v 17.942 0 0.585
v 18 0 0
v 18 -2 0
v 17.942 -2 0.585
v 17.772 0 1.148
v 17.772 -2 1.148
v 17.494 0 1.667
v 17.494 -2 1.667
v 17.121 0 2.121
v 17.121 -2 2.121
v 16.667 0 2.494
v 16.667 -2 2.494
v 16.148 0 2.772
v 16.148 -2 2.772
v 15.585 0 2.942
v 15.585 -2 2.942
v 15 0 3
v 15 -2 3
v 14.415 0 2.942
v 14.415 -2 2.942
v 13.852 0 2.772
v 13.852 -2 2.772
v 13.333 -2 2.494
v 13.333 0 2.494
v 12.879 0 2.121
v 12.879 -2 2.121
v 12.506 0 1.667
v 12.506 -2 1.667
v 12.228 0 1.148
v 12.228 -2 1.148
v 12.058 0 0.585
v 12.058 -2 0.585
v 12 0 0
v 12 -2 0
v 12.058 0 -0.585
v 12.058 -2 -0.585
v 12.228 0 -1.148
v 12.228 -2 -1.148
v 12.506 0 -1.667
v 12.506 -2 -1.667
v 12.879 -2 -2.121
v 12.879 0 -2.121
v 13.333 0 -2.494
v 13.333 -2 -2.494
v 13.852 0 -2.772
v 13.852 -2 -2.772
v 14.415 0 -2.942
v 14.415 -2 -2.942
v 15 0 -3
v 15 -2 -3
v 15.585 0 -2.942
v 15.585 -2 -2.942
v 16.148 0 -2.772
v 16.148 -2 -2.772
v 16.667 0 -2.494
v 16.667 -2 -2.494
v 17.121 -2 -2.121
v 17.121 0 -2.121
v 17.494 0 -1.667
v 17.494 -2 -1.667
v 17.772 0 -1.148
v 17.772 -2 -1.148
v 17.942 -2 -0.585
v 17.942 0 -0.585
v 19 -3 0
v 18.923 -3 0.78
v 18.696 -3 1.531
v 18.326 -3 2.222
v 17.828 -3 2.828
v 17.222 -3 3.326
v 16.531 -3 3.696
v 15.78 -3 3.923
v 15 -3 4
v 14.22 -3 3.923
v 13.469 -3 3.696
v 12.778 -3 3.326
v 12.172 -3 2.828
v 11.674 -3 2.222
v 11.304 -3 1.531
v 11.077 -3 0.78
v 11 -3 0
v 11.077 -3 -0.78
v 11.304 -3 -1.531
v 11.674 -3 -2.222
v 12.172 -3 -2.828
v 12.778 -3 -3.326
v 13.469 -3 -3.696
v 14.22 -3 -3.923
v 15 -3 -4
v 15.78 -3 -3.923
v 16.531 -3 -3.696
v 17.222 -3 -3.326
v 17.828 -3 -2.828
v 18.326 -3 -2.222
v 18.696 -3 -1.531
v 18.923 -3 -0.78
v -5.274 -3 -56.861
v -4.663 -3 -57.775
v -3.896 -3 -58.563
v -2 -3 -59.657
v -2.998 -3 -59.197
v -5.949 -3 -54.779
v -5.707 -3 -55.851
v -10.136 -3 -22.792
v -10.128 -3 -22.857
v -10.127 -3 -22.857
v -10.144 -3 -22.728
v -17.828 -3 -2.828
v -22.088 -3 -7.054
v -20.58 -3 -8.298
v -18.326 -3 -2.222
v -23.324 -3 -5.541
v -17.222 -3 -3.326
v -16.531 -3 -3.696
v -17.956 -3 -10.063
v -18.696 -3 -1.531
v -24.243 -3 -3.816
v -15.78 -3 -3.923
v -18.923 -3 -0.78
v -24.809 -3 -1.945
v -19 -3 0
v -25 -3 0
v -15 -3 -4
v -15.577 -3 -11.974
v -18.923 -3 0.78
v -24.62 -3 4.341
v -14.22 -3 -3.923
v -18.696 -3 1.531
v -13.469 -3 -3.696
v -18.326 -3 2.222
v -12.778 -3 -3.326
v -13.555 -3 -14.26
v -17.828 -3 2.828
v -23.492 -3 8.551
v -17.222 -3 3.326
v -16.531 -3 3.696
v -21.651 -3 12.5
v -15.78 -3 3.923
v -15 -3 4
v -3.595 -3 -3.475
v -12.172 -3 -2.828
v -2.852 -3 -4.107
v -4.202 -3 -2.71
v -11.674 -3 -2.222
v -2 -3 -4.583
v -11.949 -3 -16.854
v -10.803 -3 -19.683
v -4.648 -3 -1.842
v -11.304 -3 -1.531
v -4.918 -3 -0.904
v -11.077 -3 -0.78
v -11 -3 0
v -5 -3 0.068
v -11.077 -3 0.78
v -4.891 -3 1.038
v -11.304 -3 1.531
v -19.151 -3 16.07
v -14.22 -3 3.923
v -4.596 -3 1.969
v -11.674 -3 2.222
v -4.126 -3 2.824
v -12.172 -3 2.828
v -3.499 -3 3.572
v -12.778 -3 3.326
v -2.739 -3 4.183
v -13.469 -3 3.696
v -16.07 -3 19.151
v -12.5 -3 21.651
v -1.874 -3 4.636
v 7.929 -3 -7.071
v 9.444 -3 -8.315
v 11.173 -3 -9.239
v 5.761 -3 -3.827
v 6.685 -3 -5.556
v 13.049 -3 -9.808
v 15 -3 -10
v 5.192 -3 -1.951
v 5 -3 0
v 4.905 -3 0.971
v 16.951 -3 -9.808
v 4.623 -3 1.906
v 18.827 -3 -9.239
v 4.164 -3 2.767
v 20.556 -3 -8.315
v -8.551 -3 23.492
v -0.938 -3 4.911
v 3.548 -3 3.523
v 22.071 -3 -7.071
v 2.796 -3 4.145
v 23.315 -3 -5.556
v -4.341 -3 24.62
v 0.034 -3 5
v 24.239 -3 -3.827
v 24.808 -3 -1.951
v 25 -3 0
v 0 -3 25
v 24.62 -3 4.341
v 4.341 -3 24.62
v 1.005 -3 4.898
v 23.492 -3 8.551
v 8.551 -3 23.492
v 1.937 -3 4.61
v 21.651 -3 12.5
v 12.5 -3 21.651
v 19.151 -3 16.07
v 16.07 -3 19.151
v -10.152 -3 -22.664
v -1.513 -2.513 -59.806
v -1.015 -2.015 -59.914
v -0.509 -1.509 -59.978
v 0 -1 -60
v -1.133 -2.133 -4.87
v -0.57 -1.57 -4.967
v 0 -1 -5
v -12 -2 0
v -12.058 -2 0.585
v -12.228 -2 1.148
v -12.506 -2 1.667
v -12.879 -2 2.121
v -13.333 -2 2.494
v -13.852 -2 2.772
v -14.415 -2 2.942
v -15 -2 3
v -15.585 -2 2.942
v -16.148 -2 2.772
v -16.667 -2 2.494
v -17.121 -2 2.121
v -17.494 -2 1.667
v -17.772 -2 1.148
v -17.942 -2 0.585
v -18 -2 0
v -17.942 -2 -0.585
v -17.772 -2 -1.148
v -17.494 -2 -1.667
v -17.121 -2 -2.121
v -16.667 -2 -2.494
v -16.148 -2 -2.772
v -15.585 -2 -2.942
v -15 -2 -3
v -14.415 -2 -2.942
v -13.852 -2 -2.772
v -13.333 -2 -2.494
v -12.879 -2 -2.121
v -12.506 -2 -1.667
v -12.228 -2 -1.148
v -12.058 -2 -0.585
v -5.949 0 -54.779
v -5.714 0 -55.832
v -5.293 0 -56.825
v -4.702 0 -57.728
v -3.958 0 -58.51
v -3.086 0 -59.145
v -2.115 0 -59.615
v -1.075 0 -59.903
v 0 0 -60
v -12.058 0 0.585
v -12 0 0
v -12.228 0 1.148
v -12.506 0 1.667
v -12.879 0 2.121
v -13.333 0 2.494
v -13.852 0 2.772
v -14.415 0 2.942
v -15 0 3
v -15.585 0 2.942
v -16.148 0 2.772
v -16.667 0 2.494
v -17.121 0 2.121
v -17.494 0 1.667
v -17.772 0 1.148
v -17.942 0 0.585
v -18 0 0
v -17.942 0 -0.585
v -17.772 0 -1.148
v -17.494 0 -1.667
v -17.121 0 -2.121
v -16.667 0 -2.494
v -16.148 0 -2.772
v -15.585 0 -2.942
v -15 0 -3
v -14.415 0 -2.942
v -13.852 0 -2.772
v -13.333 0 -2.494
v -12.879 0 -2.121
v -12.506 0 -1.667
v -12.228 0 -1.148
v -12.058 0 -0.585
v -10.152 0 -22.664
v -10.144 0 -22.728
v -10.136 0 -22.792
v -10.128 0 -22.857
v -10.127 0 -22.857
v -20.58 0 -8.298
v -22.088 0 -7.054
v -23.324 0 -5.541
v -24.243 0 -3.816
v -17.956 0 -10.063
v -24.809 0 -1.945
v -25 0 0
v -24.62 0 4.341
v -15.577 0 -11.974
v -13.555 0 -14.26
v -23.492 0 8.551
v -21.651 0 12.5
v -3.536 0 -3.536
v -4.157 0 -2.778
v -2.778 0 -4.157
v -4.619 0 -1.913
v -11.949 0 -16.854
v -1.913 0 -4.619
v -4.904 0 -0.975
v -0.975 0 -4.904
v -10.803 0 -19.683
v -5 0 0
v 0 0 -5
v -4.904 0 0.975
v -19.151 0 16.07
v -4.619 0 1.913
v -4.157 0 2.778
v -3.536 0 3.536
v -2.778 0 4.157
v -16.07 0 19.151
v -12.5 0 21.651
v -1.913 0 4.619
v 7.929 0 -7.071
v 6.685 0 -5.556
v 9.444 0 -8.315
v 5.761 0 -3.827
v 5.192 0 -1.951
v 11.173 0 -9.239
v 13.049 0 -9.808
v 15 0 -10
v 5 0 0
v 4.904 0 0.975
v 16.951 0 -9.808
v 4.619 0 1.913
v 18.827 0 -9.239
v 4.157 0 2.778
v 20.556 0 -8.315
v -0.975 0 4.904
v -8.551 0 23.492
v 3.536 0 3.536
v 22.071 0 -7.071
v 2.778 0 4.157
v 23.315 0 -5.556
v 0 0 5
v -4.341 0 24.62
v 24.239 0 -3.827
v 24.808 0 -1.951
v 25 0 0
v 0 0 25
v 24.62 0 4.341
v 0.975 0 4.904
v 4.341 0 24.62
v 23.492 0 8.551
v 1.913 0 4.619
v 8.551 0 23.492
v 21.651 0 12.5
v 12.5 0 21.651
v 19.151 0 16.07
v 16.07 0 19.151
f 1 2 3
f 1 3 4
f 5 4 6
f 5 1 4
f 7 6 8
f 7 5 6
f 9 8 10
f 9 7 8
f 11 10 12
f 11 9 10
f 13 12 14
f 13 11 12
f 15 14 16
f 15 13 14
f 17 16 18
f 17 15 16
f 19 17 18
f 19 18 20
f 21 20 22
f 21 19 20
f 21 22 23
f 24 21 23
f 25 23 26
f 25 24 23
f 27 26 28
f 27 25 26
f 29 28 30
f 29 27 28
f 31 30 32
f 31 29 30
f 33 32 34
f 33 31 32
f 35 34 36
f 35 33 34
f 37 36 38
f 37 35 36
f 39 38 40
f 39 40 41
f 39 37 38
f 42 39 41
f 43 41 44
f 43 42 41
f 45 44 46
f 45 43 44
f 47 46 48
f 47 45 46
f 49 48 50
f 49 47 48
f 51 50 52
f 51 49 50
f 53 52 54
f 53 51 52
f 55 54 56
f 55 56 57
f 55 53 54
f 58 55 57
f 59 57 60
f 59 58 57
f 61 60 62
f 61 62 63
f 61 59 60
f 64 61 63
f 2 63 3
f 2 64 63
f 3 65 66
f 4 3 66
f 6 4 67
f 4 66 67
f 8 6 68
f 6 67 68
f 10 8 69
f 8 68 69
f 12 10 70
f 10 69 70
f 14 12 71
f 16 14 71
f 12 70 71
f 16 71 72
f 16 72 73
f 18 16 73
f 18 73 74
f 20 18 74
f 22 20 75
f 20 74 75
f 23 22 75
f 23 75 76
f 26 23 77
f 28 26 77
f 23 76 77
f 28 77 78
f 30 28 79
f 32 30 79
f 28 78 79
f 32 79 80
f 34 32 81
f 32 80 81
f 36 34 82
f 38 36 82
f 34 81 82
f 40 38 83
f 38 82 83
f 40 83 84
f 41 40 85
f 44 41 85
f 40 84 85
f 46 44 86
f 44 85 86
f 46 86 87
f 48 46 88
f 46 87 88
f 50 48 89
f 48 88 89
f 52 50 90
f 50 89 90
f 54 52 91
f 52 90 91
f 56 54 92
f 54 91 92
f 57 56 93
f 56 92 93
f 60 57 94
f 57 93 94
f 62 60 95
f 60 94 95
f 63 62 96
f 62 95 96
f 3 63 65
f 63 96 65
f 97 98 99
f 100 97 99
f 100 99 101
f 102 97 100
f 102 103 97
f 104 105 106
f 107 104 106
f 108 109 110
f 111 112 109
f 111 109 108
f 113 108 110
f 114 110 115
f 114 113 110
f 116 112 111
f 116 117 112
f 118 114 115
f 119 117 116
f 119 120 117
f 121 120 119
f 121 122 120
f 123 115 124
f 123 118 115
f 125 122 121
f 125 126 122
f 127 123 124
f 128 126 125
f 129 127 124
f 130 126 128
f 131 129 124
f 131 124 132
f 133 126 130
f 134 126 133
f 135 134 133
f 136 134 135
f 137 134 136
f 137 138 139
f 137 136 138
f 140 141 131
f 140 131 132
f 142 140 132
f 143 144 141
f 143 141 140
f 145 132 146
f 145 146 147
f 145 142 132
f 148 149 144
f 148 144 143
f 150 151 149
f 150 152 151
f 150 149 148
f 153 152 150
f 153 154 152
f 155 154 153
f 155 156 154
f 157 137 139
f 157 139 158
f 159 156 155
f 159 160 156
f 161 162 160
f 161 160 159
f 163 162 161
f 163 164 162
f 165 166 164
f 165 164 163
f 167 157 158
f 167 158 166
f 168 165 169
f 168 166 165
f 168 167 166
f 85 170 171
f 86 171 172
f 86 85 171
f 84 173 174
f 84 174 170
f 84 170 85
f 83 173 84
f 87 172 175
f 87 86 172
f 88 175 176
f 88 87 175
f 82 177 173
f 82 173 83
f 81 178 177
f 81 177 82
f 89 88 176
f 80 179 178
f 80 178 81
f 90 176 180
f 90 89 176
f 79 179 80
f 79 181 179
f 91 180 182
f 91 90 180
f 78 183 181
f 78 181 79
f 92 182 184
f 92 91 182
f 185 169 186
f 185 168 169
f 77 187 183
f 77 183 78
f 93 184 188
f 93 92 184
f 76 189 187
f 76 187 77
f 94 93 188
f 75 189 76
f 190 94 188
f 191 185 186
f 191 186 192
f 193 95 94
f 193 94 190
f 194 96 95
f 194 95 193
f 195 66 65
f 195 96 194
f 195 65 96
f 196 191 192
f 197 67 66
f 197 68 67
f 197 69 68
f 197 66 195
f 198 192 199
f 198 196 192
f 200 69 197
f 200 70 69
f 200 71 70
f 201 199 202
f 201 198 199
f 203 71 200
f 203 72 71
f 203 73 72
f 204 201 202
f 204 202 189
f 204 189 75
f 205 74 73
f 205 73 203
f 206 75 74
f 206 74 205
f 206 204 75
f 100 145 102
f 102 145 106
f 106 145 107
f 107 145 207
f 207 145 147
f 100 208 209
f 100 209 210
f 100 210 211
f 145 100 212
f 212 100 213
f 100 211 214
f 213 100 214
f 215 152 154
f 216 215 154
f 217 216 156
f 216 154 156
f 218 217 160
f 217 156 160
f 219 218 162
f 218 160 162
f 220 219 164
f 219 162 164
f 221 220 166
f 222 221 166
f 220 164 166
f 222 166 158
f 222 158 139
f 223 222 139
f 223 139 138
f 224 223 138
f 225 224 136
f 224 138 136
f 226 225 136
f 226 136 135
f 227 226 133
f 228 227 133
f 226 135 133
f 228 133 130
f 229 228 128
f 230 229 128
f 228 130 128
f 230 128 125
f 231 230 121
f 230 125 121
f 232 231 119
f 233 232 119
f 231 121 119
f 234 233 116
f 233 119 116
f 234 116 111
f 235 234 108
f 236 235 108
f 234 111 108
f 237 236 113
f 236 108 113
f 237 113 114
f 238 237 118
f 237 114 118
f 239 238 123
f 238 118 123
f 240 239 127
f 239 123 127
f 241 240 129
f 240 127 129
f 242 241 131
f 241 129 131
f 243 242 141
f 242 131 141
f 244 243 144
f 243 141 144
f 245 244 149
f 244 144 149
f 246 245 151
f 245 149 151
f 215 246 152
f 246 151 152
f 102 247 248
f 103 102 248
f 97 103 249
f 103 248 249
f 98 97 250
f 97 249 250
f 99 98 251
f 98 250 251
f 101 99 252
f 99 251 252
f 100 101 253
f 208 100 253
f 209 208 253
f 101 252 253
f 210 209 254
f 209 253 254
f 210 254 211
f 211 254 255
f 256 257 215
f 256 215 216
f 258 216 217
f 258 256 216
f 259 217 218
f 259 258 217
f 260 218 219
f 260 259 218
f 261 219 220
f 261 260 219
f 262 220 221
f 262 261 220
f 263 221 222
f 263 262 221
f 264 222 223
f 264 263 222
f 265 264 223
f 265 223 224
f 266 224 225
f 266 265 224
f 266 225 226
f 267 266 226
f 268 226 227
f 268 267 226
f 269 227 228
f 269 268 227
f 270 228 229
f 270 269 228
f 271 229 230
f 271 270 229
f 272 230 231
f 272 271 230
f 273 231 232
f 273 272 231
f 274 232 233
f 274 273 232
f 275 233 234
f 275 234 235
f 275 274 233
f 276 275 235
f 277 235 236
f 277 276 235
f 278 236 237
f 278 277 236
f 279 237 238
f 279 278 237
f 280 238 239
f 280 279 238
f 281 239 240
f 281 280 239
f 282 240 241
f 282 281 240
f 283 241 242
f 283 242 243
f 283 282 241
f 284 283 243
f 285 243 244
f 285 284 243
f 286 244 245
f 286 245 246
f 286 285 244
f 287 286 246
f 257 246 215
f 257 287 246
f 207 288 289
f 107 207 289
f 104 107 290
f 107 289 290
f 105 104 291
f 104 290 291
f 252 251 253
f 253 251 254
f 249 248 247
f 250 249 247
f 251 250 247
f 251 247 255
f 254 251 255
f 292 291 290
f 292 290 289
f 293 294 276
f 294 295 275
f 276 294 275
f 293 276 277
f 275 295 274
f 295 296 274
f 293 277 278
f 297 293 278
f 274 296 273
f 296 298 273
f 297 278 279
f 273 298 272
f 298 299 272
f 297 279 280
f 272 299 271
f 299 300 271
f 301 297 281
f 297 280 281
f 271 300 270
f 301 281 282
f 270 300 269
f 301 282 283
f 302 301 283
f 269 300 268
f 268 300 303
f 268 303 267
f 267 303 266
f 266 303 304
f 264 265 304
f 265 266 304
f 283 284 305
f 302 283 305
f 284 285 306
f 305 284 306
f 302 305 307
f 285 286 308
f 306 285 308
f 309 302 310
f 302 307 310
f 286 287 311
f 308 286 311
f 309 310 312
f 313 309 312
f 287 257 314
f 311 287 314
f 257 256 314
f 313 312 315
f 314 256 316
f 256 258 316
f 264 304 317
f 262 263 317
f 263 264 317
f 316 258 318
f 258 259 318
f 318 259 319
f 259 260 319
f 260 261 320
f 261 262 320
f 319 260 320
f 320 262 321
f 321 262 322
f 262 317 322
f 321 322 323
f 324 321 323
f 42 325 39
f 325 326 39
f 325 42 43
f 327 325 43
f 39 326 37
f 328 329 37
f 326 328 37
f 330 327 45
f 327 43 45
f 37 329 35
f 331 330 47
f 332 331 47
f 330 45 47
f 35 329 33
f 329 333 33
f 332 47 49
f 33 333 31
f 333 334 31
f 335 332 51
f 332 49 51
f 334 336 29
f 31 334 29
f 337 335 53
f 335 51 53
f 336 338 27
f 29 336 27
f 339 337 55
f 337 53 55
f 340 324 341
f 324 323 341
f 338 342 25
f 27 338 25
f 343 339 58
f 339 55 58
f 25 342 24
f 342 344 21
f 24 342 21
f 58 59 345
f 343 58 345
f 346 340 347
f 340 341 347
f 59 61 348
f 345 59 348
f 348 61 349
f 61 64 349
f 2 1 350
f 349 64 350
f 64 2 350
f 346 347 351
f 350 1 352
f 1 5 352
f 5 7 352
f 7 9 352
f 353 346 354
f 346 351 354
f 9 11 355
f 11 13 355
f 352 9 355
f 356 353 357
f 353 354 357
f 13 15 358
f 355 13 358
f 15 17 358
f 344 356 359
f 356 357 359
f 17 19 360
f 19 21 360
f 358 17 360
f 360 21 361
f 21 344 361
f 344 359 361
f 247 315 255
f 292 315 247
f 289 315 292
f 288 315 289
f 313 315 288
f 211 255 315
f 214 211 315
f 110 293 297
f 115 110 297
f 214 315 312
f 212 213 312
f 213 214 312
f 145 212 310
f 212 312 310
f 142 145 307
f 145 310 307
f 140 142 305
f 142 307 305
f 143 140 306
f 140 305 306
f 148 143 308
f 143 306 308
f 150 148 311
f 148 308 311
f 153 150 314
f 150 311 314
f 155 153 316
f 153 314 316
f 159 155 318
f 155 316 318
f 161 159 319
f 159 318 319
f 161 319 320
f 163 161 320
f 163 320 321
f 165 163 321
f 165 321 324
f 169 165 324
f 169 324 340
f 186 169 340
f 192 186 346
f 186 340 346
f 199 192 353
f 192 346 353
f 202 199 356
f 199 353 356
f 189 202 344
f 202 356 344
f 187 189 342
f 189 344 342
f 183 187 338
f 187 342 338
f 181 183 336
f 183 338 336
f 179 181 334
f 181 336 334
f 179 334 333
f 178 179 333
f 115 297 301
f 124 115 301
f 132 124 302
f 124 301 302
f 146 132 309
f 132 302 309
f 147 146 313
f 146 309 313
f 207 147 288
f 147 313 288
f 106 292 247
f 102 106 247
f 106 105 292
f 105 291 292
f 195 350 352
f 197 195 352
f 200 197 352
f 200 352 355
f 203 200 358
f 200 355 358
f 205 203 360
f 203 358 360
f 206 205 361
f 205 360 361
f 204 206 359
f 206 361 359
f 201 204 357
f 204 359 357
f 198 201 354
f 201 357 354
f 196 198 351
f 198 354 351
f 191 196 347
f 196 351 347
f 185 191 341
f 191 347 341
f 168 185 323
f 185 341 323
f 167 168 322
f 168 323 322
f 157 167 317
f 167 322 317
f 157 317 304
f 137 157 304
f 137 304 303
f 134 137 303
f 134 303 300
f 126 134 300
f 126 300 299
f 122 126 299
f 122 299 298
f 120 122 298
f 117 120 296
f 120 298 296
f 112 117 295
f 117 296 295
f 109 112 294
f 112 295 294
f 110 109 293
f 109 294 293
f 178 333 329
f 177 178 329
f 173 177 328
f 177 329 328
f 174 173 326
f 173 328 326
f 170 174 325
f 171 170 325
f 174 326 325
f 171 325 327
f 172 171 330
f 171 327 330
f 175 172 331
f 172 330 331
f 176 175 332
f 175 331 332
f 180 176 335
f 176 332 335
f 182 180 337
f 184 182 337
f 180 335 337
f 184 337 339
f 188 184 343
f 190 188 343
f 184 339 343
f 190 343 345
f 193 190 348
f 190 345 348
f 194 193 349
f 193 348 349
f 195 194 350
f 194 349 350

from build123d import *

# Parameters (mm, degrees)
F0_R     = 3
F1_DEPTH = 3
F2_SIZE  = 1
F3_SIZE  = 2


with BuildPart() as f1:
    # F0 (on Front) → F1 (new body)
    with BuildSketch(Plane.XZ):
        with BuildLine():
            ThreePointArc((0, -5), (-3.535534, 3.535534), (5, 0))
            ThreePointArc((5, 0), (15, -10), (25, 0))
            ThreePointArc((25, 0), (0, 25), (-25, 0))
            ThreePointArc((-25, 0), (-23.826115, -4.701031), (-20.580062, -8.298368))
            Line((-20.580062, -8.298368), (-17.955888, -10.062938))
            ThreePointArc((-17.955888, -10.062938), (-12.696811, -15.52306), (-10.152199, -22.664192))
            Line((-10.152199, -22.664192), (-10.126959, -22.857049))
            Line((-10.126959, -22.857049), (-5.949267, -54.778603))
            ThreePointArc((-5.949267, -54.778603), (-3.957801, -58.509524), (0, -60))
            Line((0, -60), (0, -5))
        make_face()
        with Locations((-15, 0)):
            Circle(F0_R, mode=Mode.SUBTRACT)
        with Locations((15, 0)):
            Circle(F0_R, mode=Mode.SUBTRACT)
        with BuildLine():
            ThreePointArc((-10.128077, -22.856554), (-10.127518, -22.856802), (-10.126959, -22.857049))
            Line((-10.126959, -22.857049), (-10.152199, -22.664192))
            ThreePointArc((-10.152199, -22.664192), (-10.139879, -22.760341), (-10.128077, -22.856554))
        make_face()
    extrude(amount=F1_DEPTH)

    # F2
    f2_edges = [f1.edges().sort_by_distance(p)[0] for p in [
        (-18, -3, 0),
        (12, -3, 0),
    ]]
    chamfer(f2_edges, length=F2_SIZE)

    # F3
    f3_edges = [f1.edges().sort_by_distance(p)[0] for p in [
        (0, -3, -32.5),
    ]]
    chamfer(f3_edges, length=F3_SIZE)


solid = f1.part
